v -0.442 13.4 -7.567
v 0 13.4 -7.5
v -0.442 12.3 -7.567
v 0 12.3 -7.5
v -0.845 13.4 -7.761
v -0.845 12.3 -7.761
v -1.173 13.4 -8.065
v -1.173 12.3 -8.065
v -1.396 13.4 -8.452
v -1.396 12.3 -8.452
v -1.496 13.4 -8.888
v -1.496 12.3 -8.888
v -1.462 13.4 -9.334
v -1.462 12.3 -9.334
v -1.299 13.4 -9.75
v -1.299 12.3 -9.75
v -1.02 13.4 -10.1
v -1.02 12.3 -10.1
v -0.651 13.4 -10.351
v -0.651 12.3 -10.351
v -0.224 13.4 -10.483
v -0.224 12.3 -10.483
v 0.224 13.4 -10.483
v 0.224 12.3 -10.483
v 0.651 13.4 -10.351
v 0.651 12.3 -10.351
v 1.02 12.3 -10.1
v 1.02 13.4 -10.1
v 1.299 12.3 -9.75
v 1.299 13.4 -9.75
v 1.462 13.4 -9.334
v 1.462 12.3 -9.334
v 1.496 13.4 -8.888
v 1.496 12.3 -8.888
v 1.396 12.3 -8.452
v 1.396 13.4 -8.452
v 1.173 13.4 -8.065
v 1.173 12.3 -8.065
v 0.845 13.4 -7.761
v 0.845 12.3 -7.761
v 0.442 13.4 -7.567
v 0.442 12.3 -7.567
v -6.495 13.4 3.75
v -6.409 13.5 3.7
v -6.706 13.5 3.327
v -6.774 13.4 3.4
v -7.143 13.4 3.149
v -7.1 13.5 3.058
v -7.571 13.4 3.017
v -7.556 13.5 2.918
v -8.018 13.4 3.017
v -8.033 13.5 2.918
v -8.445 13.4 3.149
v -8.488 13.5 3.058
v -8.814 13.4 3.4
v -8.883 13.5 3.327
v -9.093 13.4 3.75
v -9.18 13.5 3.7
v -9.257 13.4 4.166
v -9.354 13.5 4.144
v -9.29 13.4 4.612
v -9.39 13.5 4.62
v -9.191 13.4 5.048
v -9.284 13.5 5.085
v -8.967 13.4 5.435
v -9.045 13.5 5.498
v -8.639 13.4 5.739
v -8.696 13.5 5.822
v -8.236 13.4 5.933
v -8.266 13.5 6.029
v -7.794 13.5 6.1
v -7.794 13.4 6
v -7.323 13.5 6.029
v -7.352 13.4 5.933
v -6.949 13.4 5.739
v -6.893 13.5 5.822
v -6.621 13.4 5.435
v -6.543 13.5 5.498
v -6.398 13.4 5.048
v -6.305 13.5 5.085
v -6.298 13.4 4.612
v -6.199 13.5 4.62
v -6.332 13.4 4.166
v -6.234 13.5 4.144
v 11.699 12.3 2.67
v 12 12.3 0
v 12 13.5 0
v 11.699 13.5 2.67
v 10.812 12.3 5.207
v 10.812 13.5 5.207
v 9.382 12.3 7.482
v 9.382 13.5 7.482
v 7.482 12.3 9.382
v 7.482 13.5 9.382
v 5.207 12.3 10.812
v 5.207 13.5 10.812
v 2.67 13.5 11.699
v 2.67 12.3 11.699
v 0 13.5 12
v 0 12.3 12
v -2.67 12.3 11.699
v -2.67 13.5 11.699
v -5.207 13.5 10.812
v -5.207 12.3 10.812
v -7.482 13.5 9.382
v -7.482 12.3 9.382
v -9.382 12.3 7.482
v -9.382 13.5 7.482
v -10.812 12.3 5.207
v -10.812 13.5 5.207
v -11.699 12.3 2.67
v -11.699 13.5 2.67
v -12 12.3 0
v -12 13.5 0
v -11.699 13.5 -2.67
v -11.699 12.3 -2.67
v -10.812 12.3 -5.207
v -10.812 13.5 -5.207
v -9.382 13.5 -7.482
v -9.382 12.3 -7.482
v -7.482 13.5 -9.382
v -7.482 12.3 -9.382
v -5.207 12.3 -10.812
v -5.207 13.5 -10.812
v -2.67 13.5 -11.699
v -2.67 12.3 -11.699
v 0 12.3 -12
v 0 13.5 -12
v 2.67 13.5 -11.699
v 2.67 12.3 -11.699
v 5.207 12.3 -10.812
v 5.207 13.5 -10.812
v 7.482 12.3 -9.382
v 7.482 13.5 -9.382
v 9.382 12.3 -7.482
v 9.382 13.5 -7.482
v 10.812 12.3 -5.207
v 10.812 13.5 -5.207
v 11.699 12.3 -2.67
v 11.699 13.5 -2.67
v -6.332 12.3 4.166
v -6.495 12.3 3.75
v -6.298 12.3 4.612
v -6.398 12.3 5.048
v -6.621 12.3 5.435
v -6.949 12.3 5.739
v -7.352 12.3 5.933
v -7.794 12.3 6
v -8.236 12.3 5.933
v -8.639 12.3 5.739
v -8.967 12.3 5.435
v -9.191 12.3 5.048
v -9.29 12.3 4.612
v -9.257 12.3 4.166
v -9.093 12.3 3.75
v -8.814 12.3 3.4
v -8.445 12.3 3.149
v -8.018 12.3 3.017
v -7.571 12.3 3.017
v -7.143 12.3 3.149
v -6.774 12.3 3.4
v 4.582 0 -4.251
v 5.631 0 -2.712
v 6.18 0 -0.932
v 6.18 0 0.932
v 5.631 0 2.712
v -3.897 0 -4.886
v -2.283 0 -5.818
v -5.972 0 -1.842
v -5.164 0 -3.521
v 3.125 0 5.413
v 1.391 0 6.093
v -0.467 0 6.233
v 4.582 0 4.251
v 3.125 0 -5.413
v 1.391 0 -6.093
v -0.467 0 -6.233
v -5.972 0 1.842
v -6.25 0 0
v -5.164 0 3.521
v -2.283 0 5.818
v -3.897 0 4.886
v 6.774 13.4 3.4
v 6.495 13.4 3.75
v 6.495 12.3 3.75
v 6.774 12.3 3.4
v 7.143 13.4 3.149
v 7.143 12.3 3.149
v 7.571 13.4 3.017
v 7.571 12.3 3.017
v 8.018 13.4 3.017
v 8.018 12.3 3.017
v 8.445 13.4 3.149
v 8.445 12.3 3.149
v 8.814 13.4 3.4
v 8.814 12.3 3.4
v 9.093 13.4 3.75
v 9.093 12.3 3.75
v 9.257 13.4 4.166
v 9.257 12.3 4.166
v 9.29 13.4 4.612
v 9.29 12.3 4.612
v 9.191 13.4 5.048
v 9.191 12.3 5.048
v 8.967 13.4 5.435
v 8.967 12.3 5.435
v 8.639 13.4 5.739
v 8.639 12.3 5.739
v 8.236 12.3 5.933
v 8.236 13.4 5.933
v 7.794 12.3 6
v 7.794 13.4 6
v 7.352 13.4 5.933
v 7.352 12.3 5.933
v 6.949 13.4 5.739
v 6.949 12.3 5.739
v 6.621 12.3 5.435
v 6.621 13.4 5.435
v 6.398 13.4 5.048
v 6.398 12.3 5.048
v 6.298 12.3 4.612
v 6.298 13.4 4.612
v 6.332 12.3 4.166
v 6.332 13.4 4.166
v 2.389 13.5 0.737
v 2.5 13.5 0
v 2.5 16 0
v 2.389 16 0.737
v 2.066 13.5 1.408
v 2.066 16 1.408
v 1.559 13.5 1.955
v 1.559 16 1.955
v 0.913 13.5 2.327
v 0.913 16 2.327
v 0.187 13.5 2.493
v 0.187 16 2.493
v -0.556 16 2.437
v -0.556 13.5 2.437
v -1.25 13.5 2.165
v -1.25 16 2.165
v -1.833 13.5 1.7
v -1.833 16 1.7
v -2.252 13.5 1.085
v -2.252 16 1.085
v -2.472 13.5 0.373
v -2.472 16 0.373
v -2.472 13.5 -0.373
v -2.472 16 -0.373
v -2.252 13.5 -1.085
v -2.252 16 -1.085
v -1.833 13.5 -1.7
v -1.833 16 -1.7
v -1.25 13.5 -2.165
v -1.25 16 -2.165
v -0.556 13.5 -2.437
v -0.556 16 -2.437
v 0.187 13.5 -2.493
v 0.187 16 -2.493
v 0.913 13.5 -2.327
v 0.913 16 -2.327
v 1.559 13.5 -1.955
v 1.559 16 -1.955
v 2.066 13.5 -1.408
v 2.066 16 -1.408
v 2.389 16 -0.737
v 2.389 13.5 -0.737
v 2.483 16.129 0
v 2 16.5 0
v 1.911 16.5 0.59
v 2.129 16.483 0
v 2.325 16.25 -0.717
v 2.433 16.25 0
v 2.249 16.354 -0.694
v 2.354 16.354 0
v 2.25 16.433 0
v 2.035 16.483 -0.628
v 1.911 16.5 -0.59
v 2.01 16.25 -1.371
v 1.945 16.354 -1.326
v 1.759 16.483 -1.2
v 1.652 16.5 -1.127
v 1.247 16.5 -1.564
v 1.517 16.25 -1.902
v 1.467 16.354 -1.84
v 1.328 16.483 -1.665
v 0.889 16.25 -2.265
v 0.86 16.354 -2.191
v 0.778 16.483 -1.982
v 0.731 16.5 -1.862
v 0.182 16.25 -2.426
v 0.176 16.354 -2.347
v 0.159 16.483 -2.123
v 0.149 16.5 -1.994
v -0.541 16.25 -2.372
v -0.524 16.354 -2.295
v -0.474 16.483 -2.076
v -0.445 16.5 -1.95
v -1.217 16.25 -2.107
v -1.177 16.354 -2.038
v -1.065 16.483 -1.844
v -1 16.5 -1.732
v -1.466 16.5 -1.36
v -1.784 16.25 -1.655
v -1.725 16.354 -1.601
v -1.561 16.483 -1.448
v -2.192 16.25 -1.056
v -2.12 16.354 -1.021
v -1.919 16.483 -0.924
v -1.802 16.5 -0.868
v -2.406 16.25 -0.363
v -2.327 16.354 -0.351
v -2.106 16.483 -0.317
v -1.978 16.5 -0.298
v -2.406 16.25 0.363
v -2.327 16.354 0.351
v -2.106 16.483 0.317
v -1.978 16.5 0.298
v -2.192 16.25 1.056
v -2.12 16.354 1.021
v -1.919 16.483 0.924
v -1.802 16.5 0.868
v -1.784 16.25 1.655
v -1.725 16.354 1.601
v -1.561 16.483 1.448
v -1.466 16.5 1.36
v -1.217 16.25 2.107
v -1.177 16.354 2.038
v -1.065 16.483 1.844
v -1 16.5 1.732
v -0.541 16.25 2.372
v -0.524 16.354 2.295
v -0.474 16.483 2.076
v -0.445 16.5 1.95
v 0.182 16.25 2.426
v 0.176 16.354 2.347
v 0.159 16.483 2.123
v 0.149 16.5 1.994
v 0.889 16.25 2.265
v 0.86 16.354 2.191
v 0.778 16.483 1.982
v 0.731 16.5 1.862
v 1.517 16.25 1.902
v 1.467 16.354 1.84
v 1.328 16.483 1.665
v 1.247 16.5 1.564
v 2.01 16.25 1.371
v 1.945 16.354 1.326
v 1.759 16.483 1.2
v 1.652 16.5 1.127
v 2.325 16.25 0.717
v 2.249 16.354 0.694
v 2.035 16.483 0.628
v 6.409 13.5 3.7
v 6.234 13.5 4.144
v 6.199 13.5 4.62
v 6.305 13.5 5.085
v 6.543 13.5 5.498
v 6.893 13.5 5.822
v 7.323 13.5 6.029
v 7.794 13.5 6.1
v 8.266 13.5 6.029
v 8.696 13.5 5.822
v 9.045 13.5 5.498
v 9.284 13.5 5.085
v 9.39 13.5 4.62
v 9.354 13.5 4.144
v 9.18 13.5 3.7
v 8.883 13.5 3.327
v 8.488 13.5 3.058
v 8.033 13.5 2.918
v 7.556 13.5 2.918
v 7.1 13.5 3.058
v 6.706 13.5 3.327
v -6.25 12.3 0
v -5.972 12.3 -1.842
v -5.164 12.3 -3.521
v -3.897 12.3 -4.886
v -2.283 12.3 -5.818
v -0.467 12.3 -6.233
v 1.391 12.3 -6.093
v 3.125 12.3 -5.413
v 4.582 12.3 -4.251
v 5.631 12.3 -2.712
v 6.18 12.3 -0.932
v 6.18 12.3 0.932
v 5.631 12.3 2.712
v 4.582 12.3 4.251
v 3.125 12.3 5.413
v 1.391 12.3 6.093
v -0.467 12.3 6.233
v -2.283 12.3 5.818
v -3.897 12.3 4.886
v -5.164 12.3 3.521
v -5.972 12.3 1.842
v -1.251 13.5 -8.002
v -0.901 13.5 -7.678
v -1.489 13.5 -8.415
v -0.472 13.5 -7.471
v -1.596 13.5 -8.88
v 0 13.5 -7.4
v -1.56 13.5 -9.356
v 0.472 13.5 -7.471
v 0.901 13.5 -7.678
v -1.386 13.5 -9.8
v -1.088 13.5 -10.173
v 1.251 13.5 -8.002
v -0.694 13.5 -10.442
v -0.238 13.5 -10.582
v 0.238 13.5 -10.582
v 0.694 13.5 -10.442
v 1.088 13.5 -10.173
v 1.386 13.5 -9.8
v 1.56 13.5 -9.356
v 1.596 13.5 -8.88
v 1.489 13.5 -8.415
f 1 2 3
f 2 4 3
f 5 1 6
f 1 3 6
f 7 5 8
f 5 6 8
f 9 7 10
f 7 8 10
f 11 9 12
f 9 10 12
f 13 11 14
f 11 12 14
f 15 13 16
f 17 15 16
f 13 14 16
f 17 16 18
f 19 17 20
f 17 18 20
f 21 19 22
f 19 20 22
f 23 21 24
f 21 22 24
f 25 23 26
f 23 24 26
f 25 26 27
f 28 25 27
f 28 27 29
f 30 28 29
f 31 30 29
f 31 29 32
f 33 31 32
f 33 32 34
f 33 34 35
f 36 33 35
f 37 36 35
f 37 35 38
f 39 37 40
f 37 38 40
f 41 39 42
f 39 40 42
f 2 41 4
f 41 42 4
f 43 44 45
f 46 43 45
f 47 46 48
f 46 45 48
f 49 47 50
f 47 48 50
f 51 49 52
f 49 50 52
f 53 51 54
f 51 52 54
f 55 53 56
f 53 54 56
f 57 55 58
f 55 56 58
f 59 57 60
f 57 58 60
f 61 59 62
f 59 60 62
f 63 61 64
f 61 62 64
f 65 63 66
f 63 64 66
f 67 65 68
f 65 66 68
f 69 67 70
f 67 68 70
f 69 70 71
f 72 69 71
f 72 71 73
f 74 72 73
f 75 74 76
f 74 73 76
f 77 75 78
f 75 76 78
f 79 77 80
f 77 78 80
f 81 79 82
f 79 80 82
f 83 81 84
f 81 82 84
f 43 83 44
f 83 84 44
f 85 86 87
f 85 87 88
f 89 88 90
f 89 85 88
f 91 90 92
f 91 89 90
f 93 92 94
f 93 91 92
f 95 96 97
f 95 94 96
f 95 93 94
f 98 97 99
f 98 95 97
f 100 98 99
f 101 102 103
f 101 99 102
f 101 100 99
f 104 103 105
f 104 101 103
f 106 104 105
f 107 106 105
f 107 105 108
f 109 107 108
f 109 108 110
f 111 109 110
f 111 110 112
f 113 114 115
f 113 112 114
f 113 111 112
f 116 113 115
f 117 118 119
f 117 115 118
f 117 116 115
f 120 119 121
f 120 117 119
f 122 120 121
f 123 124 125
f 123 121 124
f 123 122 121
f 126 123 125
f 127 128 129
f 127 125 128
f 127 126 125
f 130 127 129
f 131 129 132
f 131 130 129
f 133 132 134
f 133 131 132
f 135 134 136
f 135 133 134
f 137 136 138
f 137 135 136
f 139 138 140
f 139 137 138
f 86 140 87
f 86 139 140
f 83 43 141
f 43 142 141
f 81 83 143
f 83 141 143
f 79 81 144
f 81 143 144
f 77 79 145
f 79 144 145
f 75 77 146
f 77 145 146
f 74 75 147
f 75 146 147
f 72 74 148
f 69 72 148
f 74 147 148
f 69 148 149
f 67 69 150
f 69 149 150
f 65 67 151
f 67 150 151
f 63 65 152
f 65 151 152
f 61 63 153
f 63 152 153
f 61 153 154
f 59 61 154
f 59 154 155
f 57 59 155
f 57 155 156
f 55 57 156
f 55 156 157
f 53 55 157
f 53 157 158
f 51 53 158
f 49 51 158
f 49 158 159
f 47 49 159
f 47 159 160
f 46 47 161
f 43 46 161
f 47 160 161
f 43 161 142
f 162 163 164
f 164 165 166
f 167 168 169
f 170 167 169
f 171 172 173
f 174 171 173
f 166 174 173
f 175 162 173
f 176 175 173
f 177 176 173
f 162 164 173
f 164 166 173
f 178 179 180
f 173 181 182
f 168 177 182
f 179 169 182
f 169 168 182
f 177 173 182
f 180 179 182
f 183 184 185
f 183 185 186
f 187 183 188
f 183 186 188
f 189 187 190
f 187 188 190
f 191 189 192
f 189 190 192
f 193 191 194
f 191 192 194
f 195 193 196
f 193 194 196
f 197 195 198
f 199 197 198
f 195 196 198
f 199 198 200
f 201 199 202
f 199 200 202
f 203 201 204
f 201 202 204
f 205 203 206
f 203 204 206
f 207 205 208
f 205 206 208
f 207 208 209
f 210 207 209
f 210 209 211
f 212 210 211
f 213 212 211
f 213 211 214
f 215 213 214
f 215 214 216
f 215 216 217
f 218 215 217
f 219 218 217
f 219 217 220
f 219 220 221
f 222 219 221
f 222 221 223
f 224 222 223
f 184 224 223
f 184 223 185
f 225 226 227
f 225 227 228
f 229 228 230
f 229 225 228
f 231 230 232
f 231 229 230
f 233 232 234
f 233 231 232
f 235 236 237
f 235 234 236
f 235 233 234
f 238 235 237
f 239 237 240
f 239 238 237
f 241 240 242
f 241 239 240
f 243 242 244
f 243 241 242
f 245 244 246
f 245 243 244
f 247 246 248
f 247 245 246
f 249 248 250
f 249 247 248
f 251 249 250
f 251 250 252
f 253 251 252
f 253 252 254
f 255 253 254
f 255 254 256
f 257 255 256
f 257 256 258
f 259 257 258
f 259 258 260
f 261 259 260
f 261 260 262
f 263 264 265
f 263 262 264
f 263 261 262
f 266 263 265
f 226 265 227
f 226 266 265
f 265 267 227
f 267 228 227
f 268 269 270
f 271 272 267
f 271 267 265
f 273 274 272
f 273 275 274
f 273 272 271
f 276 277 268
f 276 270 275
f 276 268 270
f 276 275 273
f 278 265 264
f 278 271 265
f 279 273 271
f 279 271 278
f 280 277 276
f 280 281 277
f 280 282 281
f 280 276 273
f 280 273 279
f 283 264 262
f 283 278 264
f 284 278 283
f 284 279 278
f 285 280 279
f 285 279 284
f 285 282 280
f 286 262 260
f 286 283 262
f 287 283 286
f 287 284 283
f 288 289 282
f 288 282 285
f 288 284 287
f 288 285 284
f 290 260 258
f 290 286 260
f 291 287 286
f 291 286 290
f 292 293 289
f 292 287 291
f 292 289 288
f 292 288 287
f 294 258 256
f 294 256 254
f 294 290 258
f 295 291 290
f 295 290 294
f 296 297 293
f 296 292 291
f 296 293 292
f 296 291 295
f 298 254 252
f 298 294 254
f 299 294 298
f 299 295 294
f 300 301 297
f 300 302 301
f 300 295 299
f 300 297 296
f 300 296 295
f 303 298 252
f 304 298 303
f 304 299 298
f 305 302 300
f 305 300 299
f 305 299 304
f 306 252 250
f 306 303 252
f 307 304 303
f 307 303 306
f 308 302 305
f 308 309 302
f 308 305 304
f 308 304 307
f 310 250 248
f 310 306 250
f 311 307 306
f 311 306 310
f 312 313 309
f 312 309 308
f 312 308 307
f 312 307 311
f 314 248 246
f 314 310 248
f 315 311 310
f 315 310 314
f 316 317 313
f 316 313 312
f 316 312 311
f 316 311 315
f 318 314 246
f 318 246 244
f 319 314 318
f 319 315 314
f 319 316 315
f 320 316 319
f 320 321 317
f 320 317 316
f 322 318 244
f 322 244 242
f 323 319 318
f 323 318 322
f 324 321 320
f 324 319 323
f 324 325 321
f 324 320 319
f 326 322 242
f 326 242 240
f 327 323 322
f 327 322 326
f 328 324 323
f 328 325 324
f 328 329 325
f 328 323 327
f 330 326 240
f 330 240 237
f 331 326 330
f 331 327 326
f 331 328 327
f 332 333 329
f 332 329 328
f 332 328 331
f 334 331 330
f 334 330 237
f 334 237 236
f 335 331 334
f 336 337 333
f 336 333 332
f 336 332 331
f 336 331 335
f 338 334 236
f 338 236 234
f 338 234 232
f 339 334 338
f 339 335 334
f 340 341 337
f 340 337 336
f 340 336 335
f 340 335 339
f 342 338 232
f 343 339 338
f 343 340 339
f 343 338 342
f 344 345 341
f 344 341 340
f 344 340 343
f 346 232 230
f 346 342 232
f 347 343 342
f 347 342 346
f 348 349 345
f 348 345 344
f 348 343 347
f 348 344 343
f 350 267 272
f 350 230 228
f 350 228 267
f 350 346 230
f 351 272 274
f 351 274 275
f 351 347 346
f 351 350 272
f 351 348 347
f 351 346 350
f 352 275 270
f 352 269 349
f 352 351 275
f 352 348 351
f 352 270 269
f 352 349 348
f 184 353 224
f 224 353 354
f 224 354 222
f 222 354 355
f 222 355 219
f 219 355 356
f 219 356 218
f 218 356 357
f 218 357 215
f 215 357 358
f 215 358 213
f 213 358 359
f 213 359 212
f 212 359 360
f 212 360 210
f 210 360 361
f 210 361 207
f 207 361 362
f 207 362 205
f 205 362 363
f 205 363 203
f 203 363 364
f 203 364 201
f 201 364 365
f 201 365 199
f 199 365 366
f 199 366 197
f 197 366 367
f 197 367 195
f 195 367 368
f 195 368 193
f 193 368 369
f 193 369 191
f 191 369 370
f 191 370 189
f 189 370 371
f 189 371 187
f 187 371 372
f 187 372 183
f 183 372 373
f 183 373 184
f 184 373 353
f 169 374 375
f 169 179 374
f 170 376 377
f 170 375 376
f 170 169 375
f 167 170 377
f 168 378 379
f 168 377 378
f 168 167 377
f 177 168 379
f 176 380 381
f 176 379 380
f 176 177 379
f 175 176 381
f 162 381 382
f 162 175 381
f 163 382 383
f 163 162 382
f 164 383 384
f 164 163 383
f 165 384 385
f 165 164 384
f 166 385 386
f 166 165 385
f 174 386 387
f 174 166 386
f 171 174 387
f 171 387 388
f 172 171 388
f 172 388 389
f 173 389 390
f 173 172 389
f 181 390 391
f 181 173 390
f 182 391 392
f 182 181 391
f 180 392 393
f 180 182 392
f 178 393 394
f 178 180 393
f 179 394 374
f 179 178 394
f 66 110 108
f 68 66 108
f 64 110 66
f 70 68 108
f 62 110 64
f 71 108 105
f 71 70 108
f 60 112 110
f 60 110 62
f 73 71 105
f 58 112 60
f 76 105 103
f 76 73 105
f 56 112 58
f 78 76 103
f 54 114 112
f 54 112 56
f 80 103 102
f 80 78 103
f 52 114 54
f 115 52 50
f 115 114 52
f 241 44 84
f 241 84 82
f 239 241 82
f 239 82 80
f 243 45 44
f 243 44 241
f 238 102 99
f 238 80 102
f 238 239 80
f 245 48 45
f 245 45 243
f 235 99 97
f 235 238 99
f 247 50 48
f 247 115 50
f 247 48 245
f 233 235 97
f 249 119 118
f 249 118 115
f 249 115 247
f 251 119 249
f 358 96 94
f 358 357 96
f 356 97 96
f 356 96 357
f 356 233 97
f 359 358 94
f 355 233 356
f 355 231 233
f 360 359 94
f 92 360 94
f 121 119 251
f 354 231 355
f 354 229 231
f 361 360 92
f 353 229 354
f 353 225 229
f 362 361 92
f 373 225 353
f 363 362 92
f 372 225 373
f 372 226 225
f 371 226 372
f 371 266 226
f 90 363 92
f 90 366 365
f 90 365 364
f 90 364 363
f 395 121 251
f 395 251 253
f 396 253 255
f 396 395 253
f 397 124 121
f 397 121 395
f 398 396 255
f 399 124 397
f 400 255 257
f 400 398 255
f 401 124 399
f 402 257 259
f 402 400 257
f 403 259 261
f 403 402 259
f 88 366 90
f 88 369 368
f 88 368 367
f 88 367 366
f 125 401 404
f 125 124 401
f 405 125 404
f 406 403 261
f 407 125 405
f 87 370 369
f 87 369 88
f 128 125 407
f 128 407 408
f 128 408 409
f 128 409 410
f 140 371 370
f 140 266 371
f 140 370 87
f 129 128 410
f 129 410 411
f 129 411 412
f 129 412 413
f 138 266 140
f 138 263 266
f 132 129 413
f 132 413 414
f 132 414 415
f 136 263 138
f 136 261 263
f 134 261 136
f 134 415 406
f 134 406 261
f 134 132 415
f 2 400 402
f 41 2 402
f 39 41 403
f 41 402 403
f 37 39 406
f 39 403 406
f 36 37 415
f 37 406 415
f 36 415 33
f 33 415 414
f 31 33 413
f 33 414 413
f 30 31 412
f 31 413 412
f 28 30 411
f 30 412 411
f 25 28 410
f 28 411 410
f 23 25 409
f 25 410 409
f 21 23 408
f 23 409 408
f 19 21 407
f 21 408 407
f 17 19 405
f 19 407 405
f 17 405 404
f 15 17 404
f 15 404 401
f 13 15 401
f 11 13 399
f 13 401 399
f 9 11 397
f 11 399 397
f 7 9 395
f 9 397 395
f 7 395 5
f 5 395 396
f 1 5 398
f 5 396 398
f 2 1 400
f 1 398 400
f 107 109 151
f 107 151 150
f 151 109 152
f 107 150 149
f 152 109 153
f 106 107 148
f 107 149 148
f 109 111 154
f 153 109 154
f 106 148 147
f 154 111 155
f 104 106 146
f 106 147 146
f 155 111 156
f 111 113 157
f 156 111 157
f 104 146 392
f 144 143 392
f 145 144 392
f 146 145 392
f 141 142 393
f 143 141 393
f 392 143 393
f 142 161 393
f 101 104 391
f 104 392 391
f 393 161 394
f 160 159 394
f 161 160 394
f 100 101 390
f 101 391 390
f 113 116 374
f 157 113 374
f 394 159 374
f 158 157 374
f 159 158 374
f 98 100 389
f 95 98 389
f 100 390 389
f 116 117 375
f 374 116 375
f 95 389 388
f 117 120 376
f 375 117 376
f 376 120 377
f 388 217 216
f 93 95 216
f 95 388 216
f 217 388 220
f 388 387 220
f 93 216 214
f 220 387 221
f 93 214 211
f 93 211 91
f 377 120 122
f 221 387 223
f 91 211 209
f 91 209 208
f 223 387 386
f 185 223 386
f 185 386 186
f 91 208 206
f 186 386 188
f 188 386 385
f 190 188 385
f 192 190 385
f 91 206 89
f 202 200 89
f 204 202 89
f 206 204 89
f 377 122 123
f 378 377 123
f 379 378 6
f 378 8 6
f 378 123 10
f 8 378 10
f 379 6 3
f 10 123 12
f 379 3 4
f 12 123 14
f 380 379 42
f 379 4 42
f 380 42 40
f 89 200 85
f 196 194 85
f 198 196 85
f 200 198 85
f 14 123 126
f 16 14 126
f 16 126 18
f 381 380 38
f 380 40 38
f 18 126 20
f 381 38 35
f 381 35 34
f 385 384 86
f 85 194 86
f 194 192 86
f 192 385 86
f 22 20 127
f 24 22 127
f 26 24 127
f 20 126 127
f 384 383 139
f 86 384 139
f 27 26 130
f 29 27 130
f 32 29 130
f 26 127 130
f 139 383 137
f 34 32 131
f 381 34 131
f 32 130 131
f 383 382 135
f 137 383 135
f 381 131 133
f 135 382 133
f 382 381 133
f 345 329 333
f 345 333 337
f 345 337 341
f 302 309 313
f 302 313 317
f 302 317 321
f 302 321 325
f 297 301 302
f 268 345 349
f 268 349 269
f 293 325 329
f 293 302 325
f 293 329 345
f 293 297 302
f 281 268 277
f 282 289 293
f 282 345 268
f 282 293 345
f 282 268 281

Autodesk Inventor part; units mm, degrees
ref_plane "YZ Plane" through (0, 0, 0) normal (1, 0, 0) x (0, 1, 0)
ref_plane "XZ Plane" through (0, 0, 0) normal (0, 1, 0) x (-1, 0, 0)
ref_plane "XY Plane" through (0, 0, 0) normal (0, 0, 1) x (1, 0, 0)
sketch "Sketch1" plane through (0, 0, 0) normal (0, 1, 0) x (-1, 0, 0)
  circle A0 centre (0, 0) radius 6.25
  dimension "d0" = 12.5
extrude "Extrusion1" add sketch "Sketch1" along normal blind 12.3
sketch "Sketch2" plane through (0, 12.3, 0) normal (0, 1, 0) x (1, 0, 0)
  circle A0 centre (0, 0) radius 12
  dimension "d3" = 24
extrude "Extrusion2" add sketch "Sketch2" along normal blind 1.2
sketch "Sketch3" plane through (0, 13.5, 0) normal (0, 1, 0) x (1, 0, 0)
  line L0 (0, 0) -> (0, 9)
  dimension "d15" = 9
hole "Hole1" at (0, 13.5, -9) direction (0, -1, 0) diameter 3 end through all countersink diameter 3.2 countersink angle 90
pattern_circular "Circular Pattern1" count 3 over 360 about axis through (0, 0, 0) along (0, 1, 0) of "Hole1"
sketch "Sketch4" plane through (0, 13.5, 0) normal (0, 1, 0) x (1, 0, 0)
  circle A0 centre (0, 0) radius 2.5
  dimension "d19" = 5
extrude "Extrusion3" add sketch "Sketch4" along normal blind 3
fillet "Fillet1" radius 0.5 1 edges at (-2.5, 16.5, 0)
properties part number "slipRing"
